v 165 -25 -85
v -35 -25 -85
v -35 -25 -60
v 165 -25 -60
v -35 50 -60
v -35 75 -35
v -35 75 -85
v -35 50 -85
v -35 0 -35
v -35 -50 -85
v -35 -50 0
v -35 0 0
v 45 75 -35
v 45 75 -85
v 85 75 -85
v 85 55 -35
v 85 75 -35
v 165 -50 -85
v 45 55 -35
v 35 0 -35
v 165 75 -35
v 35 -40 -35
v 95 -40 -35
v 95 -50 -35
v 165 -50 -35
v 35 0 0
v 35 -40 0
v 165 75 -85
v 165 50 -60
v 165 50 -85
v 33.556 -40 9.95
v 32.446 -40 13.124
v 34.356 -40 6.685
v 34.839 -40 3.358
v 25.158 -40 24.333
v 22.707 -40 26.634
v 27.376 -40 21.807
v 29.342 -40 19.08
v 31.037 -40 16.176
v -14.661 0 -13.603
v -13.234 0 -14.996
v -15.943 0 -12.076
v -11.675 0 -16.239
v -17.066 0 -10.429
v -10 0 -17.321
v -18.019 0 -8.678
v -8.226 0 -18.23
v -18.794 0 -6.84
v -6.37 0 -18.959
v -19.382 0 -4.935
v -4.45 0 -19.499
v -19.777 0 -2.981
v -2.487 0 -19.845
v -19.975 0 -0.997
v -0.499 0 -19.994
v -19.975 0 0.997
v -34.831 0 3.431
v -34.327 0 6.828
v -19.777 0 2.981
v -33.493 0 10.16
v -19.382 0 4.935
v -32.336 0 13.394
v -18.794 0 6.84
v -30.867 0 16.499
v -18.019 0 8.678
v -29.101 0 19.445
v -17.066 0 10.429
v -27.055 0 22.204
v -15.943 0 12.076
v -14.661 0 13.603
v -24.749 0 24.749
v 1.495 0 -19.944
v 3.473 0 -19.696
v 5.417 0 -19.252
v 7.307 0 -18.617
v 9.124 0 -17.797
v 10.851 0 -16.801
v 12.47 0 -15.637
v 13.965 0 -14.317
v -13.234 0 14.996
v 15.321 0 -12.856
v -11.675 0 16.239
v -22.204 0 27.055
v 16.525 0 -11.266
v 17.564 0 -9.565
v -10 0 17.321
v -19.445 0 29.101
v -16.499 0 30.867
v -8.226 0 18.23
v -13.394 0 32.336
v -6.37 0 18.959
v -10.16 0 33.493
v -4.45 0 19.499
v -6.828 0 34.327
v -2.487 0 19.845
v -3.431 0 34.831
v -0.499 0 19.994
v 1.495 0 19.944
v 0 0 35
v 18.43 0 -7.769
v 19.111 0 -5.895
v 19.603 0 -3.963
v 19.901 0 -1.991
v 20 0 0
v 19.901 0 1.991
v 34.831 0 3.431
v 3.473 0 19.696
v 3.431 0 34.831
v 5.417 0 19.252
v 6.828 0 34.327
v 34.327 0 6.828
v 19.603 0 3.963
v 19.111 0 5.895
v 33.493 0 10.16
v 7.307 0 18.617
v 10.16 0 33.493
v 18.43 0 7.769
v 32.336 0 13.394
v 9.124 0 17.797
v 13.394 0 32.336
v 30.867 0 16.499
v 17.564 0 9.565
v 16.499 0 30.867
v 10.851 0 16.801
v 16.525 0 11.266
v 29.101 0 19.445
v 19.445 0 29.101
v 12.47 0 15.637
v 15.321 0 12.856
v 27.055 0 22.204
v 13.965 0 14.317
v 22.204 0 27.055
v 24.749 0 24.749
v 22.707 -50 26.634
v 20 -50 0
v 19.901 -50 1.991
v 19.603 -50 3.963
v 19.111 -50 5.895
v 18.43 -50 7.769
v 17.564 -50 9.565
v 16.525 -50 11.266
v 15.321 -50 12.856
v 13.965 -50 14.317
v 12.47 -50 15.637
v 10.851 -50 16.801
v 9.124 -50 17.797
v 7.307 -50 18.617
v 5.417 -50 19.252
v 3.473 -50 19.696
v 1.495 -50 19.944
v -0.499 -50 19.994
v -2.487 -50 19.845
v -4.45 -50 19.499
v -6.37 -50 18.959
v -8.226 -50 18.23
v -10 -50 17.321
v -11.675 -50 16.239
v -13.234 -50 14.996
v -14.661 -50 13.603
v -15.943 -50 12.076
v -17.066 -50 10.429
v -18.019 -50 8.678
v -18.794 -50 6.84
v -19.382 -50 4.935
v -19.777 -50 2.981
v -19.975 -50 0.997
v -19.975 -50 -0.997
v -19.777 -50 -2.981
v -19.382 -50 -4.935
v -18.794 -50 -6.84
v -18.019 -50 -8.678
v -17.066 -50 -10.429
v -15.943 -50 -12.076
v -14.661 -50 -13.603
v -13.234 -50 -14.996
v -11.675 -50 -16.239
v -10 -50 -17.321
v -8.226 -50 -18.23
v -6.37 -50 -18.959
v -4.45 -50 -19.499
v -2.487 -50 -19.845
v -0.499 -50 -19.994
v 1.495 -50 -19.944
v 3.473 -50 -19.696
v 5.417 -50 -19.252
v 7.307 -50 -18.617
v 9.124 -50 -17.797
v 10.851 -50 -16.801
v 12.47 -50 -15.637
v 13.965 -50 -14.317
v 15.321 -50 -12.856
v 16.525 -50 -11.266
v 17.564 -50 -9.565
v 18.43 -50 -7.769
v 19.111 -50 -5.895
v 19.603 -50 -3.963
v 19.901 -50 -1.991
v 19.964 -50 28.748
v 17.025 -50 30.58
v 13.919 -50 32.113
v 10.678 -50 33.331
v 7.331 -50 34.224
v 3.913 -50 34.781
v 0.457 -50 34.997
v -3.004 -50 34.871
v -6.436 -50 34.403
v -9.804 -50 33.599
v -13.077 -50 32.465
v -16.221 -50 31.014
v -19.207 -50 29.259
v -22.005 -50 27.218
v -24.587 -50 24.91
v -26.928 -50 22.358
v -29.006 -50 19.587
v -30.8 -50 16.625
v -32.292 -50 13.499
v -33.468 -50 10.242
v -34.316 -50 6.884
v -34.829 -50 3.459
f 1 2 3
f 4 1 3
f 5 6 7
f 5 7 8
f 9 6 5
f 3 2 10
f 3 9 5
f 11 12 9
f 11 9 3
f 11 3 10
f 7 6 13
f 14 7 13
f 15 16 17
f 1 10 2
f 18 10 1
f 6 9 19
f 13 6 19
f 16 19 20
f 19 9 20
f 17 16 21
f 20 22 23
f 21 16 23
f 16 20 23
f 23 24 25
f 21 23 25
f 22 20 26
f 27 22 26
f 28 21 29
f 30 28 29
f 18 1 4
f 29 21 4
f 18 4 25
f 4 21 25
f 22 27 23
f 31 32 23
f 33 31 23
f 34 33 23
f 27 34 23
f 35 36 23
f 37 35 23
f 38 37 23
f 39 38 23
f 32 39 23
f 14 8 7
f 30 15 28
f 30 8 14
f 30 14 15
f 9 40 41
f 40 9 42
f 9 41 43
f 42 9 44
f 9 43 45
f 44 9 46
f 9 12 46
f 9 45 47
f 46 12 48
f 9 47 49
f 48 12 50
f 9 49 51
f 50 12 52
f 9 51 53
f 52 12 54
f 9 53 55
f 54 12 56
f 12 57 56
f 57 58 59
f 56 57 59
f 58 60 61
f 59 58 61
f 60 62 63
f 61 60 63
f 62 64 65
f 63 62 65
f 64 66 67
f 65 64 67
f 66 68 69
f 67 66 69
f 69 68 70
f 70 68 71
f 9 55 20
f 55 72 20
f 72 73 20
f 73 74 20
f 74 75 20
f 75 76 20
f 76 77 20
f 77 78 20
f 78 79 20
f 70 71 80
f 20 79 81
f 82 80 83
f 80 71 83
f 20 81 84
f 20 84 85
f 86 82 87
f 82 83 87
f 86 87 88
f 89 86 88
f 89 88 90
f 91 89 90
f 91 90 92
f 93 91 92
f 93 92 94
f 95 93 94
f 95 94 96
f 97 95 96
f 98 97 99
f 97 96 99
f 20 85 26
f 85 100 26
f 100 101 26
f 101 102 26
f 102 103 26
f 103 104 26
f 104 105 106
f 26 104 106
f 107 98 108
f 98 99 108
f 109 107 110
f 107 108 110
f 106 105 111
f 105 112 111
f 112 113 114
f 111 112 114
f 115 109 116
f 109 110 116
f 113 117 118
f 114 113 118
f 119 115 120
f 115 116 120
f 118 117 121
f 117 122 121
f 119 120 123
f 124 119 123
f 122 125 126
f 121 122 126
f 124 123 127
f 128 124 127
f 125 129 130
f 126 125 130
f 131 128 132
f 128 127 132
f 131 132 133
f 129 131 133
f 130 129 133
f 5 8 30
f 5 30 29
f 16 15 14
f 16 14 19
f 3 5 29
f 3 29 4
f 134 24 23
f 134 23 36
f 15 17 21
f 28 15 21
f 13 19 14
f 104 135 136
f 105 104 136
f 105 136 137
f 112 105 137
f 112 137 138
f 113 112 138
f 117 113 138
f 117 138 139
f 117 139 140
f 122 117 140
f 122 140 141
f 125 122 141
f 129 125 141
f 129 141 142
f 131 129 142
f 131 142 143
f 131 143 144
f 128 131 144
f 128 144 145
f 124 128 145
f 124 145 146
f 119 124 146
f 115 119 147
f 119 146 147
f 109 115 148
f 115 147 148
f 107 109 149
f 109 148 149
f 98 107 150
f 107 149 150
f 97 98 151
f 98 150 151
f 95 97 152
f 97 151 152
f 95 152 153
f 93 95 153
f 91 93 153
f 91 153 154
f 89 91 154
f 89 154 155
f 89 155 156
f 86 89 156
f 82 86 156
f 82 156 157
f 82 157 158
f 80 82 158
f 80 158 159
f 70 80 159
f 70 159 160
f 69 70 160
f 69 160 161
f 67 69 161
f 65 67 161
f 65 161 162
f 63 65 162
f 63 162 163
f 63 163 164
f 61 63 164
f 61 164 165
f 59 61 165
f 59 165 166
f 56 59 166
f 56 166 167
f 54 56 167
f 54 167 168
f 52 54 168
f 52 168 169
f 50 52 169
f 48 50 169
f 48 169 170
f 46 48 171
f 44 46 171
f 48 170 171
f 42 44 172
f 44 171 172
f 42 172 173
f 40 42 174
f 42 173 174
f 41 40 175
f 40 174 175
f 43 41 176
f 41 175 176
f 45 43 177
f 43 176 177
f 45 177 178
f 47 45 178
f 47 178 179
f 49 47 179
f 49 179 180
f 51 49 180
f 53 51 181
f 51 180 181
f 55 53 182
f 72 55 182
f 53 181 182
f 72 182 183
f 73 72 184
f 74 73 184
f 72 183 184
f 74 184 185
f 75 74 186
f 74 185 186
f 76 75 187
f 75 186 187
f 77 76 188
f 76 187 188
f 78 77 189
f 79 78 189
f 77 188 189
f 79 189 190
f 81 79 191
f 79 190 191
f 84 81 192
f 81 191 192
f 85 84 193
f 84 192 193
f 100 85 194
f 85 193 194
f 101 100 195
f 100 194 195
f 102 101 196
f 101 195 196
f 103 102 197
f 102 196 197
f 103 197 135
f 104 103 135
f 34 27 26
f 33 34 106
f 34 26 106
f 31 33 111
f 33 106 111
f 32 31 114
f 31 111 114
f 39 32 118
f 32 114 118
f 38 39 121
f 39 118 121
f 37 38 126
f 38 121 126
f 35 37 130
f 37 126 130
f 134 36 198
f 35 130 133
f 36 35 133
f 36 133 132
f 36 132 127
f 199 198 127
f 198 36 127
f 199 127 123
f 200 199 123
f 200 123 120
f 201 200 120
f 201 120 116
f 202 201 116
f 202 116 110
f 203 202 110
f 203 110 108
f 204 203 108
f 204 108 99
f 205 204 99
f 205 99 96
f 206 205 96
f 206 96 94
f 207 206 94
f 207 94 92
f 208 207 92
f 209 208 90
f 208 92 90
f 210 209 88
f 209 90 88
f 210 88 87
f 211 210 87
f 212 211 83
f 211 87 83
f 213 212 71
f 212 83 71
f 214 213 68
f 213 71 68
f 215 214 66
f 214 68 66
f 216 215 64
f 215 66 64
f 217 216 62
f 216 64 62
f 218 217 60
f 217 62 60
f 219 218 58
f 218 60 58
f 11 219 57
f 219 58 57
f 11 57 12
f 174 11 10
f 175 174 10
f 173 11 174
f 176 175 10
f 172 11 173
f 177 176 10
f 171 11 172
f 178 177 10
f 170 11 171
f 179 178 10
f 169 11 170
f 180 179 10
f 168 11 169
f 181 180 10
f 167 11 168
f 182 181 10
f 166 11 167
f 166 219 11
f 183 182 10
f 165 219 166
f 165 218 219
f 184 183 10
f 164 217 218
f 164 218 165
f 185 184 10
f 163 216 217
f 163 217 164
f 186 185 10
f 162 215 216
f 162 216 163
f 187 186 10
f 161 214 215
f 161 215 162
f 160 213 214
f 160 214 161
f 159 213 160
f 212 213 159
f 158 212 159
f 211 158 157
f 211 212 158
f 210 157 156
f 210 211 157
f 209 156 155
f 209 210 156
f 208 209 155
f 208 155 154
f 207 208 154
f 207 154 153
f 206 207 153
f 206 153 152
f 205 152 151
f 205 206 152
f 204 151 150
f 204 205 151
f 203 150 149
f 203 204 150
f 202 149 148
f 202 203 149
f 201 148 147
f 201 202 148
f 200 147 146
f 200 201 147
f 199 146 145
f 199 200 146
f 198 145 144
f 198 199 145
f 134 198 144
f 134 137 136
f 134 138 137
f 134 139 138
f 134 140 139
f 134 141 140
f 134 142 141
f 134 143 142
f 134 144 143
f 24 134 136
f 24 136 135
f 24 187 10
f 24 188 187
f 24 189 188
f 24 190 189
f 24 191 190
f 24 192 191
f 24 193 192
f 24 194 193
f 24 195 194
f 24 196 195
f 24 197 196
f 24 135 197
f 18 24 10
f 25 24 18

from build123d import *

# Parameters (mm, degrees)
PAD_DEPTH         = 50
SKETCH001_R       = 20
POCKET_DEPTH      = 50.001
POCKET_DEPTH_BACK = 0.001
PAD001_DEPTH      = 10
SKETCH003_W       = 200
SKETCH003_H       = 125
PAD002_DEPTH      = 50
SKETCH004_W       = 25
SKETCH004_H       = 75
POCKET001_DEPTH   = 200.001
POCKET002_DEPTH   = 40


with BuildPart() as part:
    # Sketch → Pad (new body)
    with BuildSketch(Plane.XZ):
        with BuildLine():
            Line((-35, -35), (35, -35))
            Line((35, -35), (35, 0))
            ThreePointArc((35, 0), (0, 35), (-35, 0))
            Line((-35, 0), (-35, -35))
        make_face()
    extrude(amount=PAD_DEPTH)

    # Sketch001 (on Face6 of Pad) → Pocket (cut, two sides)
    with BuildSketch(Plane.XZ.offset(50)) as pocket_sk:
        Circle(SKETCH001_R)
    extrude(amount=-POCKET_DEPTH, mode=Mode.SUBTRACT)
    extrude(pocket_sk.sketch, amount=POCKET_DEPTH_BACK, mode=Mode.SUBTRACT)

    # Sketch002 (on Face5 of Pocket) → Pad001 (join)
    with BuildSketch(Plane.XZ.offset(50)):
        Polygon((35, -35), (95, -35), (22.707273, 26.634184), align=None)
    extrude(amount=-PAD001_DEPTH)

    # Sketch003 (on Face8 of Pad001) → Pad002 (join)
    with BuildSketch(Plane(origin=(0, 0, -35), x_dir=(1, 0, 0), z_dir=(0, 0, -1))):
        with Locations((65, -12.5)):
            Rectangle(SKETCH003_W, SKETCH003_H)
    extrude(amount=PAD002_DEPTH)

    # Sketch004 (on Face10 of Pad002) → Pocket001 (cut, through all)
    with BuildSketch(Plane(origin=(165, 0, 0), x_dir=(0, 0, 1), z_dir=(1, 0, 0))):
        with Locations((-72.5, -12.5)):
            Rectangle(SKETCH004_W, SKETCH004_H)
    extrude(amount=-POCKET001_DEPTH, mode=Mode.SUBTRACT)

    # Sketch005 (on Face16 of Pocket001) → Pocket002 (cut)
    with BuildSketch(Plane(origin=(85, 0, 0), x_dir=(0, 0, 1), z_dir=(1, 0, 0))):
        Polygon((-35, -55), (-35, -75), (-85, -75), align=None)
    extrude(amount=-POCKET002_DEPTH, mode=Mode.SUBTRACT)


solid = part.part
